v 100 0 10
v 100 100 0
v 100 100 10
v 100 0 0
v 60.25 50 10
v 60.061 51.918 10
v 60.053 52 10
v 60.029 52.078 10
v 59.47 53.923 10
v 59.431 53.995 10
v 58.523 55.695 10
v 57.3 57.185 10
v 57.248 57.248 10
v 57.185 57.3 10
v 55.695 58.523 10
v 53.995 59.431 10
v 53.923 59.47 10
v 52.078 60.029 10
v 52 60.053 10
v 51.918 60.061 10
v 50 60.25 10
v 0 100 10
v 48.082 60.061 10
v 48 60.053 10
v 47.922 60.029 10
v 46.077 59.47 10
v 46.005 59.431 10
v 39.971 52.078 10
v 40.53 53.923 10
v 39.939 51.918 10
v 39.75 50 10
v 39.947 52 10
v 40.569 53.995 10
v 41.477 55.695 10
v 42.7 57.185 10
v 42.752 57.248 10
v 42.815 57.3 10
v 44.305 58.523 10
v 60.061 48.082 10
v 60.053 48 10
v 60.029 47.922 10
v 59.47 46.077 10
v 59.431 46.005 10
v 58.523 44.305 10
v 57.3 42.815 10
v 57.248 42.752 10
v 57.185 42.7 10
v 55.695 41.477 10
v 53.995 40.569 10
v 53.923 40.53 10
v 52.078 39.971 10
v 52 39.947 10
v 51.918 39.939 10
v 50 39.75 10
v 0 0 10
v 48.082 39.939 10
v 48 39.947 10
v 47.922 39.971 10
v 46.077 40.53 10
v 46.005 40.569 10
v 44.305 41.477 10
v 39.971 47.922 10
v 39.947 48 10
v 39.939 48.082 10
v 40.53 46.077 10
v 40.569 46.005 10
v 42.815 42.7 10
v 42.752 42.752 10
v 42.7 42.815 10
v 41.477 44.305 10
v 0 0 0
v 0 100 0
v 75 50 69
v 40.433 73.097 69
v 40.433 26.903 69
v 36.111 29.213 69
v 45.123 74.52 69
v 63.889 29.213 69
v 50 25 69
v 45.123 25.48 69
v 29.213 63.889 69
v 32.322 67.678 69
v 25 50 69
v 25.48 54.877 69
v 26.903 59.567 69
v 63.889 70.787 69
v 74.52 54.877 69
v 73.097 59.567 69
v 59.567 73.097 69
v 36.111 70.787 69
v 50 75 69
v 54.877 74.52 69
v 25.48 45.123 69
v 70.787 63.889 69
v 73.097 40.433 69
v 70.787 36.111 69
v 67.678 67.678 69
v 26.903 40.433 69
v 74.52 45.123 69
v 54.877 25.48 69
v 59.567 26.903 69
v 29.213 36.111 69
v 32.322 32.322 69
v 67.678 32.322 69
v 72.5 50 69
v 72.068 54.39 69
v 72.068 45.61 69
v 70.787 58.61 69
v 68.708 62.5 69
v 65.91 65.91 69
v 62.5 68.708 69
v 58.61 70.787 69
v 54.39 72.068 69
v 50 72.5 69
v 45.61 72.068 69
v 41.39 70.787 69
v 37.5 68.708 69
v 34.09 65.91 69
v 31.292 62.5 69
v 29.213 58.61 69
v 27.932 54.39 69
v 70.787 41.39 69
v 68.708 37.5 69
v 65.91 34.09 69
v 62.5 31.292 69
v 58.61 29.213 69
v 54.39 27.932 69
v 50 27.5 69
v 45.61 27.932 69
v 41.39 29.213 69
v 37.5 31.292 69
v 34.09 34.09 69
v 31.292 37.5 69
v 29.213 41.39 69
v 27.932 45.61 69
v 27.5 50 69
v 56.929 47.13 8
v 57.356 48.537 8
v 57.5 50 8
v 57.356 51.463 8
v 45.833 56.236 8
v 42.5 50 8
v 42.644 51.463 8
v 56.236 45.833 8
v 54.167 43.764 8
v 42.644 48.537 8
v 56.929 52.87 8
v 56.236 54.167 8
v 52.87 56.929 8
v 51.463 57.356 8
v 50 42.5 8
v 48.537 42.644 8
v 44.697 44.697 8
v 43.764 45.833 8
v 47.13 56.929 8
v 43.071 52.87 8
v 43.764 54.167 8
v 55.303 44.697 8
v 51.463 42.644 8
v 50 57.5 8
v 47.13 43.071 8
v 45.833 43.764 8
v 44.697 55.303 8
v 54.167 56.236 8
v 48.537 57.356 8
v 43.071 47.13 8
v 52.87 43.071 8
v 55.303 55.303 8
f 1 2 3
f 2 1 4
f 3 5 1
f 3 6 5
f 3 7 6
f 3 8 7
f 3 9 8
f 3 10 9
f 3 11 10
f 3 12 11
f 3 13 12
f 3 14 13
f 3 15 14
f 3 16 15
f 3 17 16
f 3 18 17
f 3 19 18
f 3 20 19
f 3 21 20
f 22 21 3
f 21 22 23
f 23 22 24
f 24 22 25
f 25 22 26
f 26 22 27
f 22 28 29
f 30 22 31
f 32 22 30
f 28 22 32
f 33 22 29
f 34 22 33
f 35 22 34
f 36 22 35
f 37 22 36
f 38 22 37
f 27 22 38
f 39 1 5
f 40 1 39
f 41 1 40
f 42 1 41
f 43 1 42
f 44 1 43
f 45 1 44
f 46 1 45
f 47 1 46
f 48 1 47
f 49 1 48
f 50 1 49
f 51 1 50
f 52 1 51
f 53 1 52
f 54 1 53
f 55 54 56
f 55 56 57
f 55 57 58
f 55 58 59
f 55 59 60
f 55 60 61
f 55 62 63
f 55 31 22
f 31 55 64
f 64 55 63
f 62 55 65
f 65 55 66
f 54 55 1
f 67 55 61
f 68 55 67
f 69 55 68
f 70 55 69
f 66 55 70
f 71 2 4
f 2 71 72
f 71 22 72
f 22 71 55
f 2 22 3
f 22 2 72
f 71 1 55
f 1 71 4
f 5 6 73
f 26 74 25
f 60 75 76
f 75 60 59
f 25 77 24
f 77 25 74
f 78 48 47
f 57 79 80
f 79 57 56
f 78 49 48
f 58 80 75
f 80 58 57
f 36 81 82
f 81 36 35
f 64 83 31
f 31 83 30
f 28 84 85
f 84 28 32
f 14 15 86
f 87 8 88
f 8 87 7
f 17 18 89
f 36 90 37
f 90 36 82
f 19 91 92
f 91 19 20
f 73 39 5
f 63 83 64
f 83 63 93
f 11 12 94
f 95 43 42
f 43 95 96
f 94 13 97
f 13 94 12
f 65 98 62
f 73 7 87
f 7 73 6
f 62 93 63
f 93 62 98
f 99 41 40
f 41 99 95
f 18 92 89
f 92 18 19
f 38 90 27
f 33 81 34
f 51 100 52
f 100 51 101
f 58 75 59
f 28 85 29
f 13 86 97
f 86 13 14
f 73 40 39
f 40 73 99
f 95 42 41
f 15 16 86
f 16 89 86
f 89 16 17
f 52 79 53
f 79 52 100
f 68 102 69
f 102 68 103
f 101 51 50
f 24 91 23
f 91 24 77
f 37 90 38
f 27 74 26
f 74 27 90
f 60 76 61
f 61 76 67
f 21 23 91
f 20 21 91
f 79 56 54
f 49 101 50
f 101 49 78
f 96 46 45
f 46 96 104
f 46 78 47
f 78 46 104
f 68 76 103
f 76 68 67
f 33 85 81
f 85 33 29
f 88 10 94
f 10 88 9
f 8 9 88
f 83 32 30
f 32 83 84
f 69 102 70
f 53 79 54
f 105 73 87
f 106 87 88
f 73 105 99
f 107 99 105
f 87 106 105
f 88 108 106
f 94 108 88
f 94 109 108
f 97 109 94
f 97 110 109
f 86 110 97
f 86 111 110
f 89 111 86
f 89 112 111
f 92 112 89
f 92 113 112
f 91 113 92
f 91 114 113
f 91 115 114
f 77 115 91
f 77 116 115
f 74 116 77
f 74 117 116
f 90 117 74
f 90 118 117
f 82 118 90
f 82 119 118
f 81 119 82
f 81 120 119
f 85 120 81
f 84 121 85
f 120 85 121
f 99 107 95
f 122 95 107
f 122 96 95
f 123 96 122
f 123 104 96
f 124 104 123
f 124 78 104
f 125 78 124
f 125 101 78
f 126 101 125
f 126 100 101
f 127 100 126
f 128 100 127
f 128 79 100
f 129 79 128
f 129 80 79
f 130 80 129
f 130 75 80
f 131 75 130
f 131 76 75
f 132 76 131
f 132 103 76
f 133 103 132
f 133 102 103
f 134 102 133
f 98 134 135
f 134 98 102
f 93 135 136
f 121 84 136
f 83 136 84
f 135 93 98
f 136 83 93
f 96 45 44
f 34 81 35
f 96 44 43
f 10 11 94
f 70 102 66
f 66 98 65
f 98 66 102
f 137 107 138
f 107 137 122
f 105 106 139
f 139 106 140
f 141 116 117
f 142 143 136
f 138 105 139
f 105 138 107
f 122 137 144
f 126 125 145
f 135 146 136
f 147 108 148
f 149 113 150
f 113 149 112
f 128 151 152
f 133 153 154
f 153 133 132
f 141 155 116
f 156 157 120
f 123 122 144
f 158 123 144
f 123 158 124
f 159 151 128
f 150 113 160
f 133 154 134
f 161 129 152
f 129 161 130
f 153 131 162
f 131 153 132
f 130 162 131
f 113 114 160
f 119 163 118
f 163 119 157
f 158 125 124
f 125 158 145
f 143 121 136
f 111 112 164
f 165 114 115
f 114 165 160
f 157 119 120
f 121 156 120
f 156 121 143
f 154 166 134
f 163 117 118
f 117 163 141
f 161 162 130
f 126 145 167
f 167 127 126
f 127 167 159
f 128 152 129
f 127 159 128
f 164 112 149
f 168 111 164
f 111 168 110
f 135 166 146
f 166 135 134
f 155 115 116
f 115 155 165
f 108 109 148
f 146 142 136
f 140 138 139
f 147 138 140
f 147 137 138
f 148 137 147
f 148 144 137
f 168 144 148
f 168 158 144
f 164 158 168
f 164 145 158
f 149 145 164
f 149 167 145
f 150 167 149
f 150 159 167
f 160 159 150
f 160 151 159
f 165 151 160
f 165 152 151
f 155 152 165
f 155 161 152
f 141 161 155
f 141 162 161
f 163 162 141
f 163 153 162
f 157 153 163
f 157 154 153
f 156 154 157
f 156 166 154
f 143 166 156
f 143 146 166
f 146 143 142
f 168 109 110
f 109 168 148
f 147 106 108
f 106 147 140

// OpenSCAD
$fn = 32;

// ----------------------------------------------------------------------
// Hopper: funnel with square flange
// ----------------------------------------------------------------------

// --- parameters (mm) ---
fl = 100;                 // flange side, X and Y
fl_t = 10;                // flange thickness
cone_h = 60;              // cone height above the flange
top_d = 50;               // cone mouth diameter
bot_d = 20;               // cone spout diameter
wall = 2.5;               // cone wall thickness

bore_d = bot_d - 2 * wall;  // spout bore diameter
total_h = fl_t + cone_h - 1;  // overall height

difference() {
  union() {
    cube([fl, fl, fl_t]);
    translate([fl / 2, fl / 2, fl_t - 1])
      cylinder(h = cone_h, d1 = bot_d, d2 = top_d);
  }
  translate([fl / 2, fl / 2, fl_t - 2])
    cylinder(h = cone_h + 1, d1 = bore_d, d2 = top_d - 2 * wall);
}
